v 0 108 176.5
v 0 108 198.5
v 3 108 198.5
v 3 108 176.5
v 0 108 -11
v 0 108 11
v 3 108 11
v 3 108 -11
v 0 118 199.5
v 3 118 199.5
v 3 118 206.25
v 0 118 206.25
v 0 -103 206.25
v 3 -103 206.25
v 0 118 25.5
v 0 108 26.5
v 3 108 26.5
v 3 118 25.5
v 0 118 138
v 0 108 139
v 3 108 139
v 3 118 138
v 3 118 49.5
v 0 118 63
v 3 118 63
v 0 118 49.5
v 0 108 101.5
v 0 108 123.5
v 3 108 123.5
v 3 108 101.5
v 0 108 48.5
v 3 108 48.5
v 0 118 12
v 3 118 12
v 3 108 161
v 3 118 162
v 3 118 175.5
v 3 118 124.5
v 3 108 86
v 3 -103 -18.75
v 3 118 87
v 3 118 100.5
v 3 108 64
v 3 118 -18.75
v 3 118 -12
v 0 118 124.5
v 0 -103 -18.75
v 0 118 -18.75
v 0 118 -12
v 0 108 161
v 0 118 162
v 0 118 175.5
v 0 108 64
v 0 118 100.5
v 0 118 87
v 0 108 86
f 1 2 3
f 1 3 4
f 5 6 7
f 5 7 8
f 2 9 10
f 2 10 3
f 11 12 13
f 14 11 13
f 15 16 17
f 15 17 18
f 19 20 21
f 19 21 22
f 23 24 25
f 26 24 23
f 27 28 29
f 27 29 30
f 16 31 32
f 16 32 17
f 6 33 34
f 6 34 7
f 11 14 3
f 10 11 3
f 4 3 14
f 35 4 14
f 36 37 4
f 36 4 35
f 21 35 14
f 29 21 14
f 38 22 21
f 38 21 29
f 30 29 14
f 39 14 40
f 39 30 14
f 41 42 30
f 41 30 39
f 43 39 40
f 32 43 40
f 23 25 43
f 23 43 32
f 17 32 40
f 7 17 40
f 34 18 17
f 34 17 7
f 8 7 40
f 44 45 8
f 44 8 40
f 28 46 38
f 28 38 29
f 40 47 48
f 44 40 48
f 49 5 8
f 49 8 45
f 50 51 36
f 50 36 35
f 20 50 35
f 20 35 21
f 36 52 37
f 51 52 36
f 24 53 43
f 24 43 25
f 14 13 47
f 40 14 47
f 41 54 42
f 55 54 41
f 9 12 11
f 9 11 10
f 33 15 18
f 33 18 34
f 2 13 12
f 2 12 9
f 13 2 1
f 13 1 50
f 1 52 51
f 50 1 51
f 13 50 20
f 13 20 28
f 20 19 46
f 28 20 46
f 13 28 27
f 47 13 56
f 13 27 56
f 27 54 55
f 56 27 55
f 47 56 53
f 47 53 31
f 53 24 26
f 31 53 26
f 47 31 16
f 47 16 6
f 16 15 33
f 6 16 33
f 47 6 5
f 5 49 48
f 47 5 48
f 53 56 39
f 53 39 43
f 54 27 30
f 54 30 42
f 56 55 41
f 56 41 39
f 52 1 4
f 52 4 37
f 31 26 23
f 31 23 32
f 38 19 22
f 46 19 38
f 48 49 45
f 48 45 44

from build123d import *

# Parameters (mm, degrees)
SKETCH2_W           = 37.5
SKETCH2_H           = 206
BOSS_EXTRUDE2_DEPTH = 3
LPATTERN1_COUNT     = 6
LPATTERN1_PITCH     = 37.5


with BuildPart() as part:
    # Sketch2 → Boss-Extrude2 (new body)
    with BuildSketch(Plane(origin=(0, 0, 0), x_dir=(0, 0, -1), z_dir=(1, 0, 0))):
        Rectangle(SKETCH2_W, SKETCH2_H)
        Polygon((18.75, 118), (18.75, 103), (-18.75, 103), (-18.75, 118), (-12, 118), (-11, 108), (11, 108), (12, 118), align=None)
    boss_extrude2 = extrude(amount=BOSS_EXTRUDE2_DEPTH)

    # LPattern1: Boss-Extrude2 ×6
    with Locations(*[(0, 0, i * LPATTERN1_PITCH) for i in range(1, LPATTERN1_COUNT)]):
        add(boss_extrude2)


solid = part.part
